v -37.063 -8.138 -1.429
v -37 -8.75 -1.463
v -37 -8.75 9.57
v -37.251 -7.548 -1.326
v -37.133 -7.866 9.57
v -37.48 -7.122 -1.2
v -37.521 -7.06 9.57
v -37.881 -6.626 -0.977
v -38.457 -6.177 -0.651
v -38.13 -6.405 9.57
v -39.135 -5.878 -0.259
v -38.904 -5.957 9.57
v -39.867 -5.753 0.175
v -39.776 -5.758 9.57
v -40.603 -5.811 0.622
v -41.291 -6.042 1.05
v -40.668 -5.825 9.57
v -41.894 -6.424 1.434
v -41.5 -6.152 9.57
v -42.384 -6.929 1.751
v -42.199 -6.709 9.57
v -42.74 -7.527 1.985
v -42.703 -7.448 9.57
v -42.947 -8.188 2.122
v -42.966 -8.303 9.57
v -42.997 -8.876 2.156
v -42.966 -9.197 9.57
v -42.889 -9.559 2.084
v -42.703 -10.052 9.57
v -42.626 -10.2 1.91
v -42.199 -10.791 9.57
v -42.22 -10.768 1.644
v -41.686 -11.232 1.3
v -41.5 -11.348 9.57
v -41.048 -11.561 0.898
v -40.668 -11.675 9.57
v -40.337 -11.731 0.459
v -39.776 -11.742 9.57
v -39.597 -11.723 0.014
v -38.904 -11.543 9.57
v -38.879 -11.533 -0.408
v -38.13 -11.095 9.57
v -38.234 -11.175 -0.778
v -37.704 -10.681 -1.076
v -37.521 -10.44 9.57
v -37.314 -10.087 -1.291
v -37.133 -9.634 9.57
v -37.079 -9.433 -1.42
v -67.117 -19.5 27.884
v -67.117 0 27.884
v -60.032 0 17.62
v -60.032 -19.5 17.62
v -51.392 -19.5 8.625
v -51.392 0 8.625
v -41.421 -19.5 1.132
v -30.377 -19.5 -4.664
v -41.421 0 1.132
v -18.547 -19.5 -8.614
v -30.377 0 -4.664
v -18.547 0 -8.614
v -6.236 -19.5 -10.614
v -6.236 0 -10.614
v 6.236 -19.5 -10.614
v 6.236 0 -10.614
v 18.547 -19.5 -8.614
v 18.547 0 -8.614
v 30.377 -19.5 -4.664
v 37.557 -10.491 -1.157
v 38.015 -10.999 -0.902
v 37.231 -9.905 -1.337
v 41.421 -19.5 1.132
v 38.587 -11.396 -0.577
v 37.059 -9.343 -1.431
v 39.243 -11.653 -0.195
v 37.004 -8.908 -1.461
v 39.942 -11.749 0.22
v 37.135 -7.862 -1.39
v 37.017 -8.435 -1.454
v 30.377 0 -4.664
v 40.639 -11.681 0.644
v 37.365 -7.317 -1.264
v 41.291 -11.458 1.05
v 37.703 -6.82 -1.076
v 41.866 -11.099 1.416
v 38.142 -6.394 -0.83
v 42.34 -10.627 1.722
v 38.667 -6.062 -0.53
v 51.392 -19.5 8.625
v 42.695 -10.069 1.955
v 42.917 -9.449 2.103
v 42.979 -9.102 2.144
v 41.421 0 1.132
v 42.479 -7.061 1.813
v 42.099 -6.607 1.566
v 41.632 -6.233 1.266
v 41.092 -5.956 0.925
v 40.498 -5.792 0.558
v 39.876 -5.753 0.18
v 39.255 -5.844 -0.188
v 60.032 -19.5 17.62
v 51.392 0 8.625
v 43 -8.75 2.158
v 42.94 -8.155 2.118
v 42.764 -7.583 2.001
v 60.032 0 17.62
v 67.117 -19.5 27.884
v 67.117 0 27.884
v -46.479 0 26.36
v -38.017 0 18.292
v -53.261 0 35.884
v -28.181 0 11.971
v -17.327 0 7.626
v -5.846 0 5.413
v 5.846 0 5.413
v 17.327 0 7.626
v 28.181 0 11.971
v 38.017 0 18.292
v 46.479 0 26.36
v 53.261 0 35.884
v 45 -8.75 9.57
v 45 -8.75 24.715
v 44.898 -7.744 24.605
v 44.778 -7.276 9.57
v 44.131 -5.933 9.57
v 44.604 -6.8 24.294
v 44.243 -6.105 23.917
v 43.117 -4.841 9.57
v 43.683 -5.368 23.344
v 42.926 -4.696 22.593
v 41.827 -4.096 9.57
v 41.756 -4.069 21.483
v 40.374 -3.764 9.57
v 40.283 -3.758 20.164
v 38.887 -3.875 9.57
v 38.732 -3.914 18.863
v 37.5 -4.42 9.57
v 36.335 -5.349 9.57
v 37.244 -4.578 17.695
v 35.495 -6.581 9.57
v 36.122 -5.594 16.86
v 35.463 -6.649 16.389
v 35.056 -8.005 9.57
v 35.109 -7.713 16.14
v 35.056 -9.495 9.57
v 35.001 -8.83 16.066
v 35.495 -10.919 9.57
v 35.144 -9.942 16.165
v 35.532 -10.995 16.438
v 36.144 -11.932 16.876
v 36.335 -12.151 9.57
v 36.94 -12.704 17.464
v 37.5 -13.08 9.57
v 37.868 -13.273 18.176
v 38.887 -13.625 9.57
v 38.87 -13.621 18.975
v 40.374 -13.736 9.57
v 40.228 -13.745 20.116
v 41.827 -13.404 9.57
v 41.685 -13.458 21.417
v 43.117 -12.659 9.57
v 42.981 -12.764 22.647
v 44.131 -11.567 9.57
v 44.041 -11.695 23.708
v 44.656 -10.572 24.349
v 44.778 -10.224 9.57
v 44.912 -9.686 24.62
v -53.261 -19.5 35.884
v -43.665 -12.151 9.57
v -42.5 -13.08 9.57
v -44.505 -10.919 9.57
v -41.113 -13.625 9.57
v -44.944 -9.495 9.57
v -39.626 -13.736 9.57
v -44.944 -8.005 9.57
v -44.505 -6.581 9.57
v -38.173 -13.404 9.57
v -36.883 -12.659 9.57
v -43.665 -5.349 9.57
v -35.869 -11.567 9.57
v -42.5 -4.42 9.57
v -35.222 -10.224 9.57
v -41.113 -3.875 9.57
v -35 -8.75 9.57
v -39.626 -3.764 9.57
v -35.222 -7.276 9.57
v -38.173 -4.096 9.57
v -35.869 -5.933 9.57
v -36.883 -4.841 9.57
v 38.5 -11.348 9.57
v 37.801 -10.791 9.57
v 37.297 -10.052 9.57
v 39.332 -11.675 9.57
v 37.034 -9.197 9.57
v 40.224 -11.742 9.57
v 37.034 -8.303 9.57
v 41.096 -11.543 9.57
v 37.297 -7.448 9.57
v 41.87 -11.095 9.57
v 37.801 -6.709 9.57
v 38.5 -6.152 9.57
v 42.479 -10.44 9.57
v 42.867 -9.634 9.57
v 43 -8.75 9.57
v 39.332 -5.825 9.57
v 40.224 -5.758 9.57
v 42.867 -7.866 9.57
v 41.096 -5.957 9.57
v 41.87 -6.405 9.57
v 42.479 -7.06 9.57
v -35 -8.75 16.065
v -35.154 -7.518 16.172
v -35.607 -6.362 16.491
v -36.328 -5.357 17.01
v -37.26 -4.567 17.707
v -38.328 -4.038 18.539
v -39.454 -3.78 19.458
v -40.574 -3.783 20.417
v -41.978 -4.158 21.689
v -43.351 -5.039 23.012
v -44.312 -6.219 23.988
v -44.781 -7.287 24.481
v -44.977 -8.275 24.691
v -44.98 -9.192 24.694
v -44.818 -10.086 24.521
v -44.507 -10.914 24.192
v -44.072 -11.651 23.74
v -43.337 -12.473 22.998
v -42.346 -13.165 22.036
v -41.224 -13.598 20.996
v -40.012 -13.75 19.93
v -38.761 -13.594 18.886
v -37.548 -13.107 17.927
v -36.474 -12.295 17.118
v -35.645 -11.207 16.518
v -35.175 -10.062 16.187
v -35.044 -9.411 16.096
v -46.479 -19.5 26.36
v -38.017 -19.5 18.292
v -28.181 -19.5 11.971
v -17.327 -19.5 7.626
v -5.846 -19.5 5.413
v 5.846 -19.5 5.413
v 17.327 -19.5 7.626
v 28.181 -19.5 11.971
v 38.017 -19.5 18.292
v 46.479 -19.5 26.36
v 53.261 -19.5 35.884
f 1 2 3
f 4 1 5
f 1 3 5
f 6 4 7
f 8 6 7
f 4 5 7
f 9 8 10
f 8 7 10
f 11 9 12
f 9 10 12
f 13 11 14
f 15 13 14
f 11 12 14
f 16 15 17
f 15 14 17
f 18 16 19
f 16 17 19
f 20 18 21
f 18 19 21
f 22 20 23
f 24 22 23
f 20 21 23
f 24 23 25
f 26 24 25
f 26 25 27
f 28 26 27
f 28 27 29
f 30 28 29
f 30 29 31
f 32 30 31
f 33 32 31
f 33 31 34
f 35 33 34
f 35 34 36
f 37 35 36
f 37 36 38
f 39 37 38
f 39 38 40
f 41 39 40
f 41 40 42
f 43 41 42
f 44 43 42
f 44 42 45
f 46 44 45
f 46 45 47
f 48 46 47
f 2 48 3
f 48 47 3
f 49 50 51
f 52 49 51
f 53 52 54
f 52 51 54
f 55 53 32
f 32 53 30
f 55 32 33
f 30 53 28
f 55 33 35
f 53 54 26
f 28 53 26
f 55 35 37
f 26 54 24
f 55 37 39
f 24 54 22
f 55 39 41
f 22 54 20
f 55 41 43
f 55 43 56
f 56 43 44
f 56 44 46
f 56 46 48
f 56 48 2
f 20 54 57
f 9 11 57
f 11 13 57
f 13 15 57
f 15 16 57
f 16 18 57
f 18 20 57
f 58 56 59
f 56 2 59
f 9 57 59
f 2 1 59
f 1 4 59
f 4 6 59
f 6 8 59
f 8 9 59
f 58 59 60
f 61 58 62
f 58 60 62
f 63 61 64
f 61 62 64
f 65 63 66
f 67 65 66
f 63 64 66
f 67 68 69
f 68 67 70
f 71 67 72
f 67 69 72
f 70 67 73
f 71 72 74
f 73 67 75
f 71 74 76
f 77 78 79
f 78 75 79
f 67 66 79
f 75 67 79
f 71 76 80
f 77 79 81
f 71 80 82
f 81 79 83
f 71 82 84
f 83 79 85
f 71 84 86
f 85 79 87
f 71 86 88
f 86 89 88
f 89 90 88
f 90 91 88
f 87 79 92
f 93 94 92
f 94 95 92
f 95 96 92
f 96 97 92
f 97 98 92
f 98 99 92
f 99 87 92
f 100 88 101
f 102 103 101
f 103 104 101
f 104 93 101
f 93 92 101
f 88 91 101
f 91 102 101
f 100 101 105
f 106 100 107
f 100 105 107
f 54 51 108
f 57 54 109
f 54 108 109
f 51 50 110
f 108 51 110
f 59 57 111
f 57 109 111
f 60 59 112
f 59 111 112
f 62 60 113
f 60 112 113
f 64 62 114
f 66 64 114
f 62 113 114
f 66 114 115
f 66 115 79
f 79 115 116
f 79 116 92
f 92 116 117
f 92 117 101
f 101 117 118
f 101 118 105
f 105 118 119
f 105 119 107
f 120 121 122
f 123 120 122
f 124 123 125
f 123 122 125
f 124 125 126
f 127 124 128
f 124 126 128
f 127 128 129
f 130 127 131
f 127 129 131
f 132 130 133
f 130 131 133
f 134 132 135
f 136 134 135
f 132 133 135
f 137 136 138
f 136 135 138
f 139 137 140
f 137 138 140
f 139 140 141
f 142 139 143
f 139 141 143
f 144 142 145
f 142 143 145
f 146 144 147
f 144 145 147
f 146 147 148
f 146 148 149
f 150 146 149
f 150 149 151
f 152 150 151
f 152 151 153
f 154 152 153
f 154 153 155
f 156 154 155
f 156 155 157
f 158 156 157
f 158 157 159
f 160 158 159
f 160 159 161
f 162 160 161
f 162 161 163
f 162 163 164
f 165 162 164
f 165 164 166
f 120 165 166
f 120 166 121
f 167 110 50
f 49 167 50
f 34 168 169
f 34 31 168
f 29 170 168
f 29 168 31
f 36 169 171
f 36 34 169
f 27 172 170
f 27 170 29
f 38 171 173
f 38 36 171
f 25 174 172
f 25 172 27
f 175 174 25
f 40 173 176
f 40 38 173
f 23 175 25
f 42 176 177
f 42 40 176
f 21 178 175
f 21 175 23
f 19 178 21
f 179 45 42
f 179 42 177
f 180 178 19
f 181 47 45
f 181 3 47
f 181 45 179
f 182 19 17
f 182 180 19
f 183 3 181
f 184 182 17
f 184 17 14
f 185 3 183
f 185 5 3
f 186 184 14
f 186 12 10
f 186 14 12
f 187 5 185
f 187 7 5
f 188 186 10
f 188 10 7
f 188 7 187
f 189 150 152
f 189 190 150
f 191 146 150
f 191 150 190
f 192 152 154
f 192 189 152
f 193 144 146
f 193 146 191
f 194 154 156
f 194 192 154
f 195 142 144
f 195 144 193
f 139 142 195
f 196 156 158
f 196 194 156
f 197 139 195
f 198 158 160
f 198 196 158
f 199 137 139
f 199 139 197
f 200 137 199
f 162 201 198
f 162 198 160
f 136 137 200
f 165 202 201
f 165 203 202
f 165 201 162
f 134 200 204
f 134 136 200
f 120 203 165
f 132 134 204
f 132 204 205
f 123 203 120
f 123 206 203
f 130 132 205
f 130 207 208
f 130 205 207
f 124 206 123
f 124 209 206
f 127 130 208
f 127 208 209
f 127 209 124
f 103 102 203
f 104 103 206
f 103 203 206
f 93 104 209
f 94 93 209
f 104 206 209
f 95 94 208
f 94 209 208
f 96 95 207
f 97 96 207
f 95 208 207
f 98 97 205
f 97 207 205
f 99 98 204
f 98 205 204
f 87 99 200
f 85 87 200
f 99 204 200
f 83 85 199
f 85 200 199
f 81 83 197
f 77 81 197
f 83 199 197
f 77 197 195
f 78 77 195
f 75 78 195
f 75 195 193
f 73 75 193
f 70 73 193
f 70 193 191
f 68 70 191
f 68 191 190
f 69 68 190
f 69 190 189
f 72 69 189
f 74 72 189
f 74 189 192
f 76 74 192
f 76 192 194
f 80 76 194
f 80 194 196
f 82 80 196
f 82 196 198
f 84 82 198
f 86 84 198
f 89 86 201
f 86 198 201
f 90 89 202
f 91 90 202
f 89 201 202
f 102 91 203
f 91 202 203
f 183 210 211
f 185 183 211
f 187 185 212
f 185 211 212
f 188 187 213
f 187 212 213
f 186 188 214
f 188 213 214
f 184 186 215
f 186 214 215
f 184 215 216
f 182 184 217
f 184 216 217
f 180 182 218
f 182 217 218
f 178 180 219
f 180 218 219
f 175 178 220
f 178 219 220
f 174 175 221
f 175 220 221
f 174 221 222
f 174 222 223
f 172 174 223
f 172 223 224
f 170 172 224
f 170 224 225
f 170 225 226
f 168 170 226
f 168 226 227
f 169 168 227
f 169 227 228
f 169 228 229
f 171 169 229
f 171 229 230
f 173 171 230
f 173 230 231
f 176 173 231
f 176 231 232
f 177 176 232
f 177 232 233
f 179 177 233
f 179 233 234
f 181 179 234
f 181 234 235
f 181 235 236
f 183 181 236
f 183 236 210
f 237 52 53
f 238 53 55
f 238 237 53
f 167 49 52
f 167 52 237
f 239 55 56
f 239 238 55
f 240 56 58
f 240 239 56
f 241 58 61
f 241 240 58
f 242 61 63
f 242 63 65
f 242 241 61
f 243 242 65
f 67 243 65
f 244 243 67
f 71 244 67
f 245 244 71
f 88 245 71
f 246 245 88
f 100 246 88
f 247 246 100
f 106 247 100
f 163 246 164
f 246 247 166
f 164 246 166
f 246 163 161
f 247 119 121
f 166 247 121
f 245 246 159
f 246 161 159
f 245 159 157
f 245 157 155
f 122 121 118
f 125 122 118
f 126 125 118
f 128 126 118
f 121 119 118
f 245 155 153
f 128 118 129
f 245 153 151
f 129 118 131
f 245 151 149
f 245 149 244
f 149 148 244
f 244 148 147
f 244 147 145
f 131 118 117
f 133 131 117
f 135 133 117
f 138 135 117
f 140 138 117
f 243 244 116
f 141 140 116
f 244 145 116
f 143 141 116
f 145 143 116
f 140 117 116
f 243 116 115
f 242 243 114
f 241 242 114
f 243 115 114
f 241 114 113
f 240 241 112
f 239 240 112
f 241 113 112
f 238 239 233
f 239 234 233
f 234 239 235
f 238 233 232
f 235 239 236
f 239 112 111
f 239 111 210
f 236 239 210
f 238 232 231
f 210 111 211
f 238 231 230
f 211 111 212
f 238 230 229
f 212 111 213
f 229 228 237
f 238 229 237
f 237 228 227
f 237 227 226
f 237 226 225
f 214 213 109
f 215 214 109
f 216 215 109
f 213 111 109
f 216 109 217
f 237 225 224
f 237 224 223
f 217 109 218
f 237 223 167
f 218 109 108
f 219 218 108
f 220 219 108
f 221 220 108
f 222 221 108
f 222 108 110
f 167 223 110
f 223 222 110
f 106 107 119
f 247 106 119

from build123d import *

# Parameters (mm, degrees)
F1_DEPTH = 19.5
F3_R     = 3
F4_DEPTH = 60.866634
F3_R_2   = 5
F5_DEPTH = 40.43


with BuildPart() as f1:
    # F0 (on Front) → F1 (new body)
    with BuildSketch(Plane.XZ):
        with BuildLine():
            Line((-53.260562, 35.884366), (-67.116969, 27.884366))
            ThreePointArc((-67.116969, 27.884366), (0, -10.865634), (67.116969, 27.884366))
            Line((67.116969, 27.884366), (53.260562, 35.884366))
            ThreePointArc((53.260562, 35.884366), (0, 5.134366), (-53.260562, 35.884366))
        make_face()
    extrude(amount=F1_DEPTH)

    # F3 (on offset) → F4 (cut, through all)
    with BuildSketch(Plane.XY.offset(50)):
        with Locations((-40, -8.75)):
            Circle(F3_R)
        with Locations((40, -8.75)):
            Circle(F3_R)
    extrude(amount=-F4_DEPTH, mode=Mode.SUBTRACT)

    # F3 (on offset) → F5 (cut)
    with BuildSketch(Plane.XY.offset(50)):
        with Locations((40, -8.75)):
            Circle(F3_R_2)
        with Locations((40, -8.75)):
            Circle(F3_R, mode=Mode.SUBTRACT)
        with Locations((-40, -8.75)):
            Circle(F3_R_2)
        with Locations((-40, -8.75)):
            Circle(F3_R, mode=Mode.SUBTRACT)
    extrude(amount=-F5_DEPTH, mode=Mode.SUBTRACT)


solid = f1.part
